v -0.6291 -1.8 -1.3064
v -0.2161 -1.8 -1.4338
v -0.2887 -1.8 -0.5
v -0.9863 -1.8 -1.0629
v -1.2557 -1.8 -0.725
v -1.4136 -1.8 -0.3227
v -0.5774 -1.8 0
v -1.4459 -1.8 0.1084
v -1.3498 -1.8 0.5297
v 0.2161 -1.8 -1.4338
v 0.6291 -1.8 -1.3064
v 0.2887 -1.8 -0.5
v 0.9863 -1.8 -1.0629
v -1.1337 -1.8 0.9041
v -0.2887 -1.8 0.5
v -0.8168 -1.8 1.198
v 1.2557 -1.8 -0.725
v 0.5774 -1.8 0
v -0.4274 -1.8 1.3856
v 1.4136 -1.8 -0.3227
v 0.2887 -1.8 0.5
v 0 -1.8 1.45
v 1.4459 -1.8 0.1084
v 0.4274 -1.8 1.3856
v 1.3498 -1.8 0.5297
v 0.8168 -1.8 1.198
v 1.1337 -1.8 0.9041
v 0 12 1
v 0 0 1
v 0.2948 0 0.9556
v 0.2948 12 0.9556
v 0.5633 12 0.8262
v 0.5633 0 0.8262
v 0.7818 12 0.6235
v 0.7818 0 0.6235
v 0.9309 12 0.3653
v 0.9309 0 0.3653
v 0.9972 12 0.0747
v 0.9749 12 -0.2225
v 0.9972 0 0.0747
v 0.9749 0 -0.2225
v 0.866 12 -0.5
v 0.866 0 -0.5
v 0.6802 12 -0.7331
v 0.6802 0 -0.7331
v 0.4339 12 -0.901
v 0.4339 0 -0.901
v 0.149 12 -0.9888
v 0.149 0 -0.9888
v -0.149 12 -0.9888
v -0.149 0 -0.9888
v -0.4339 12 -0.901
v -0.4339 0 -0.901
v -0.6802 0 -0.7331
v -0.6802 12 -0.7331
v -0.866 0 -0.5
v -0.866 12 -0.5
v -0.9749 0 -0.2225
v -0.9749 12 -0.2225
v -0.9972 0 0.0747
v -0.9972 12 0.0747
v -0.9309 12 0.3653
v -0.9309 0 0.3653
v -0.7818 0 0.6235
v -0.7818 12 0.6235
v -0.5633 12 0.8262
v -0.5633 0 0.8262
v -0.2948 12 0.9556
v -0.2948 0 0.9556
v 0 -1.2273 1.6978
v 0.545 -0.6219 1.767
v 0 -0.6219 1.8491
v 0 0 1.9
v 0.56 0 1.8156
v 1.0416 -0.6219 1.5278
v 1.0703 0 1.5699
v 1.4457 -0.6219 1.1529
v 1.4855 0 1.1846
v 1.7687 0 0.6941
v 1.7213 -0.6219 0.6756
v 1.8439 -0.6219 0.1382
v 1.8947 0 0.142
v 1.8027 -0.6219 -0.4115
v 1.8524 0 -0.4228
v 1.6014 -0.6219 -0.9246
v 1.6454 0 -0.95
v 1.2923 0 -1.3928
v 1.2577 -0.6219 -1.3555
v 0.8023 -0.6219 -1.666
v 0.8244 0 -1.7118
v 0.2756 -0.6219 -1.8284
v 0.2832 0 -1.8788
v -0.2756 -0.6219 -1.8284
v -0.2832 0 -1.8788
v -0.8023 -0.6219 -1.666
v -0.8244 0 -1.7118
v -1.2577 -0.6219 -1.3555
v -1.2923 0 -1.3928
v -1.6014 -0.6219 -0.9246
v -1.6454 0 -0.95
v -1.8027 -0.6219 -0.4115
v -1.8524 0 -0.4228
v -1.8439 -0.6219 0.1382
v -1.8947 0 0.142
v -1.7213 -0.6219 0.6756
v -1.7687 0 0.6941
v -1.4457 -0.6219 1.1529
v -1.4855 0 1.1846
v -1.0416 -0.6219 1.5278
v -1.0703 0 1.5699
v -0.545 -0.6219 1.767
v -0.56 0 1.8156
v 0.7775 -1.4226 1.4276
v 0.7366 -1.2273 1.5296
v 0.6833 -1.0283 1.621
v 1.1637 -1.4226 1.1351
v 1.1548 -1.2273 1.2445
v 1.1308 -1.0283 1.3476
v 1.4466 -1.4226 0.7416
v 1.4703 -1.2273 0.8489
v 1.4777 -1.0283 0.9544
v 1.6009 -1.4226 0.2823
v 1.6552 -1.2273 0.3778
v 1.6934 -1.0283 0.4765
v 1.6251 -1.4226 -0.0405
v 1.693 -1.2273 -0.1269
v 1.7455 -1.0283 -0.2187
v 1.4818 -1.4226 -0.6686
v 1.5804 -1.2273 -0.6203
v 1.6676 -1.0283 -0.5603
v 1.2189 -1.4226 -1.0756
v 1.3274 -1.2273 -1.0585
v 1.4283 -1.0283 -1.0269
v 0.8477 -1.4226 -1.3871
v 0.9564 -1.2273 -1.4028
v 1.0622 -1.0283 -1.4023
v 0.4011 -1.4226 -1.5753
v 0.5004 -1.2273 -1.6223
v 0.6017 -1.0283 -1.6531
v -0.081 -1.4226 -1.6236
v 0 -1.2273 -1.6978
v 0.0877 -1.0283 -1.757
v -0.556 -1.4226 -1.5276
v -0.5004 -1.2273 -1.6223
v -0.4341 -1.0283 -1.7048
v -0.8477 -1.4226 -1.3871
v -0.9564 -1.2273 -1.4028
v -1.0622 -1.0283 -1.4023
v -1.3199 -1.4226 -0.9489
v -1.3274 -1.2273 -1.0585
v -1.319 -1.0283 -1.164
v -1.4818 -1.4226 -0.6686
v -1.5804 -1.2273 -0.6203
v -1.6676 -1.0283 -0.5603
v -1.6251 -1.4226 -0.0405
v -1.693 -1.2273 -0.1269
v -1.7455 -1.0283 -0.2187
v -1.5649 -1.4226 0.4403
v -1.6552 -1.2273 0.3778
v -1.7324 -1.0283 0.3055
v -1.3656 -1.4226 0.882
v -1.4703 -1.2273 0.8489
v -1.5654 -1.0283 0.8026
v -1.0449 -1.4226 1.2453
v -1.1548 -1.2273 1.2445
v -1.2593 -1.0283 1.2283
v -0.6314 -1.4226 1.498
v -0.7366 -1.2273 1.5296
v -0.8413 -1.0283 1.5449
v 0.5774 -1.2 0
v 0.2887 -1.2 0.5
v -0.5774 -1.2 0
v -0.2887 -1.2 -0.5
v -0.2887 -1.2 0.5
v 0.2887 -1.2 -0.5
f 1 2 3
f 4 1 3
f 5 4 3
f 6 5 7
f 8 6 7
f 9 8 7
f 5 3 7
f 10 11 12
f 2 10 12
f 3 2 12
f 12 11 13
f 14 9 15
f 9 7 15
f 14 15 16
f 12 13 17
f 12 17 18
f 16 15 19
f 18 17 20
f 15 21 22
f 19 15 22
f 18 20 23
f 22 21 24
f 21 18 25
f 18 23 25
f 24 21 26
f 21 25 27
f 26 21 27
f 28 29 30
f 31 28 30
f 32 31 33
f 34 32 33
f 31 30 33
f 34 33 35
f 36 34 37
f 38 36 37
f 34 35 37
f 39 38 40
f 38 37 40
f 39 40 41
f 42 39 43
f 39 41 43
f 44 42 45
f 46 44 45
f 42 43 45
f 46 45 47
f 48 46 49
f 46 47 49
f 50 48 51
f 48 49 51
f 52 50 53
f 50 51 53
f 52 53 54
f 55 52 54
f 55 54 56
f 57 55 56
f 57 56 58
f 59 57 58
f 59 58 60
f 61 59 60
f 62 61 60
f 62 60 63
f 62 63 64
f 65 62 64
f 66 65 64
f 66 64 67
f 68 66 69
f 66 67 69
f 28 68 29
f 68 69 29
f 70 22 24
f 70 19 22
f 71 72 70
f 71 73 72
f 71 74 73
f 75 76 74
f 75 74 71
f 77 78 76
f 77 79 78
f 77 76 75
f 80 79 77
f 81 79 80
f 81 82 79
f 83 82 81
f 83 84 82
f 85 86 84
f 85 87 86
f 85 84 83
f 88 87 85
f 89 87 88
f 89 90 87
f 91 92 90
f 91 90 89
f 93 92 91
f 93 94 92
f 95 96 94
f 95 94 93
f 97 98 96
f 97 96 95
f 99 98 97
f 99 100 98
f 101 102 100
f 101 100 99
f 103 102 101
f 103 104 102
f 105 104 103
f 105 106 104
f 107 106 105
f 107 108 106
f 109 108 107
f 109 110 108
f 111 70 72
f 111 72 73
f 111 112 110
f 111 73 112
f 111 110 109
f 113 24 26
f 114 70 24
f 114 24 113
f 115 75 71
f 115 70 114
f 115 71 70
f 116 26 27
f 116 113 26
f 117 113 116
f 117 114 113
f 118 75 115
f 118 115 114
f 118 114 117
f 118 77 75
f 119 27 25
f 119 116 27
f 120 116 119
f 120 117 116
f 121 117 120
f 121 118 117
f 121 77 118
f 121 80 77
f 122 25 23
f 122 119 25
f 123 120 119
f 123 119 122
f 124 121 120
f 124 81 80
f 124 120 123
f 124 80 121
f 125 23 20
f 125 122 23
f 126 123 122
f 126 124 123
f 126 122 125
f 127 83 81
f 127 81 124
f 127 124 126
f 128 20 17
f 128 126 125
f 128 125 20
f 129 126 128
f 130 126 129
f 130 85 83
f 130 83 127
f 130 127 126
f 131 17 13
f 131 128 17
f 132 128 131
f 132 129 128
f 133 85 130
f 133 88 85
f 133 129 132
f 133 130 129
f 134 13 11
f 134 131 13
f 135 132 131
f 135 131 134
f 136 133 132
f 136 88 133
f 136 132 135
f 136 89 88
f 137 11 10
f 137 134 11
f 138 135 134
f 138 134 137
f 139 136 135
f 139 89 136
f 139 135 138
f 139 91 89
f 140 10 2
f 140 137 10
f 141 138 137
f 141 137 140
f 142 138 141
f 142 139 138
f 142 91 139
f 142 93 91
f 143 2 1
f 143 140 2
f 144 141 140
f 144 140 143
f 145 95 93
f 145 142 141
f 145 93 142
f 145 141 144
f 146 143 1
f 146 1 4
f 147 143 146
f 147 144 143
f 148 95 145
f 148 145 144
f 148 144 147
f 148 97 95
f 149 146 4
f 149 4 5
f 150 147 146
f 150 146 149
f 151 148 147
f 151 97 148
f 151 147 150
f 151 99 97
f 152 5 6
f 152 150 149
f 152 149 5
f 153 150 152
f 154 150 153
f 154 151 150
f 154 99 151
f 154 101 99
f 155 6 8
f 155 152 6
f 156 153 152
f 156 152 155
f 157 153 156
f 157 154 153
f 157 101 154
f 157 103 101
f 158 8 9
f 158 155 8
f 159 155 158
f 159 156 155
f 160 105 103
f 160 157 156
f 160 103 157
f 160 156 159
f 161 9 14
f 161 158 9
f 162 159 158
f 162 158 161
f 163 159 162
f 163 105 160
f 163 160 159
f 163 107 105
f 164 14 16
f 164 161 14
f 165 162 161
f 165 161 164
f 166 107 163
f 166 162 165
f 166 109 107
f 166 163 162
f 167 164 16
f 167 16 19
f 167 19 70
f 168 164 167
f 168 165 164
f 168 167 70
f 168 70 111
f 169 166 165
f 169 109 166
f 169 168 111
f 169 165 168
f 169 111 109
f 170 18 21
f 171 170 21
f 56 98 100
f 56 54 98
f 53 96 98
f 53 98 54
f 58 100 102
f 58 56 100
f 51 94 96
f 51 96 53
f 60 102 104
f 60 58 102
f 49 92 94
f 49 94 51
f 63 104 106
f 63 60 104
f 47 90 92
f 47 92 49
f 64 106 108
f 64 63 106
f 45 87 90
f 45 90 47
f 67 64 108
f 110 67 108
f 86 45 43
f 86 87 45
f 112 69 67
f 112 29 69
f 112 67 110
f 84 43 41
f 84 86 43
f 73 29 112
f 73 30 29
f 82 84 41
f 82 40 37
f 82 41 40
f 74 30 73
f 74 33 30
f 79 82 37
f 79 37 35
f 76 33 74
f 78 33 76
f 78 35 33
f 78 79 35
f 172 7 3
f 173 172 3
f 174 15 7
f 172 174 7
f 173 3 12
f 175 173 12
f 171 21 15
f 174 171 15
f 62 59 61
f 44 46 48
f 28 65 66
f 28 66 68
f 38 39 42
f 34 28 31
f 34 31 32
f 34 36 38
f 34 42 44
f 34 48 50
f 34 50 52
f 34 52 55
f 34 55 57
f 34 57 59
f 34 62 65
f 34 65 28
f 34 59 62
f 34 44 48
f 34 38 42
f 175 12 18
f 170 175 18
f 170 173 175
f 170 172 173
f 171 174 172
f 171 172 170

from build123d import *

# Parameters (mm, degrees)
SKETCH_1_R          = 1
EXTRUDE_375_DEPTH   = 12
EXTRUDE_START       = -1.8
SKETCH_1_3_R        = 1.9
SKETCH_1_3_R_2      = 1
EXTRUDE_453_DEPTH   = 1.8
CUT_EXTRUDE_1_DEPTH = 0.6


with BuildPart() as part:
    # 草图1 → Extrude 375 (new body)
    with BuildSketch(Plane(origin=(0, 0, 0), x_dir=(1, 0, 0), z_dir=(0, 1, 0))):
        with Locations(Location((0, 0, 0), (0, 0, 270))):
            Circle(SKETCH_1_R)
    extrude(amount=EXTRUDE_375_DEPTH)

    # 草图1<3> → Extrude 453 (add)
    # profile 1 of 2: a face of its own
    with BuildSketch(Plane(origin=(0, 0, 0), x_dir=(1, 0, 0), z_dir=(0, 1, 0)).offset(EXTRUDE_START)):
        with Locations(Location((0, 0, 0), (0, 0, 270))):
            Circle(SKETCH_1_3_R)
        with Locations(Location((0, 0, 0), (0, 0, 270))):
            Circle(SKETCH_1_3_R_2, mode=Mode.SUBTRACT)
    # profile 2 of 2: a face of its own
    with BuildSketch(Plane(origin=(0, 0, 0), x_dir=(1, 0, 0), z_dir=(0, 1, 0)).offset(EXTRUDE_START)):
        with Locations(Location((0, 0, 0), (0, 0, 270))):
            Circle(SKETCH_1_3_R_2)
    extrude(amount=EXTRUDE_453_DEPTH)

    # 草图2 → 切除-旋转1 (revolve, cut)
    with BuildSketch(Plane.XY, mode=Mode.PRIVATE) as cut_revolve_1_sk:
        with BuildLine():
            Line((-1.9, 0), (-1.9, -1.8))
            Line((-1.9, -1.8), (-1.45, -1.8))
            ThreePointArc((-1.45, -1.8), (-1.785795063, -0.927698766), (-1.9, 0))
        make_face()
    revolve(cut_revolve_1_sk.sketch.rotate(Axis((0, 0, 0), (0, 1, 0)), 90), axis=Axis((0, 0, 0), (0, 1, 0)), mode=Mode.SUBTRACT)

    # 草图3 → 切除-拉伸1 (cut)
    with BuildSketch(Plane.XZ.offset(1.8)):
        Polygon((-0.288675135, -0.5), (0.288675135, -0.5), (0.577350269, 0), (0.288675135, 0.5), (-0.288675135, 0.5), (-0.577350269, 0), align=None)
    extrude(amount=-CUT_EXTRUDE_1_DEPTH, mode=Mode.SUBTRACT)


solid = part.part
